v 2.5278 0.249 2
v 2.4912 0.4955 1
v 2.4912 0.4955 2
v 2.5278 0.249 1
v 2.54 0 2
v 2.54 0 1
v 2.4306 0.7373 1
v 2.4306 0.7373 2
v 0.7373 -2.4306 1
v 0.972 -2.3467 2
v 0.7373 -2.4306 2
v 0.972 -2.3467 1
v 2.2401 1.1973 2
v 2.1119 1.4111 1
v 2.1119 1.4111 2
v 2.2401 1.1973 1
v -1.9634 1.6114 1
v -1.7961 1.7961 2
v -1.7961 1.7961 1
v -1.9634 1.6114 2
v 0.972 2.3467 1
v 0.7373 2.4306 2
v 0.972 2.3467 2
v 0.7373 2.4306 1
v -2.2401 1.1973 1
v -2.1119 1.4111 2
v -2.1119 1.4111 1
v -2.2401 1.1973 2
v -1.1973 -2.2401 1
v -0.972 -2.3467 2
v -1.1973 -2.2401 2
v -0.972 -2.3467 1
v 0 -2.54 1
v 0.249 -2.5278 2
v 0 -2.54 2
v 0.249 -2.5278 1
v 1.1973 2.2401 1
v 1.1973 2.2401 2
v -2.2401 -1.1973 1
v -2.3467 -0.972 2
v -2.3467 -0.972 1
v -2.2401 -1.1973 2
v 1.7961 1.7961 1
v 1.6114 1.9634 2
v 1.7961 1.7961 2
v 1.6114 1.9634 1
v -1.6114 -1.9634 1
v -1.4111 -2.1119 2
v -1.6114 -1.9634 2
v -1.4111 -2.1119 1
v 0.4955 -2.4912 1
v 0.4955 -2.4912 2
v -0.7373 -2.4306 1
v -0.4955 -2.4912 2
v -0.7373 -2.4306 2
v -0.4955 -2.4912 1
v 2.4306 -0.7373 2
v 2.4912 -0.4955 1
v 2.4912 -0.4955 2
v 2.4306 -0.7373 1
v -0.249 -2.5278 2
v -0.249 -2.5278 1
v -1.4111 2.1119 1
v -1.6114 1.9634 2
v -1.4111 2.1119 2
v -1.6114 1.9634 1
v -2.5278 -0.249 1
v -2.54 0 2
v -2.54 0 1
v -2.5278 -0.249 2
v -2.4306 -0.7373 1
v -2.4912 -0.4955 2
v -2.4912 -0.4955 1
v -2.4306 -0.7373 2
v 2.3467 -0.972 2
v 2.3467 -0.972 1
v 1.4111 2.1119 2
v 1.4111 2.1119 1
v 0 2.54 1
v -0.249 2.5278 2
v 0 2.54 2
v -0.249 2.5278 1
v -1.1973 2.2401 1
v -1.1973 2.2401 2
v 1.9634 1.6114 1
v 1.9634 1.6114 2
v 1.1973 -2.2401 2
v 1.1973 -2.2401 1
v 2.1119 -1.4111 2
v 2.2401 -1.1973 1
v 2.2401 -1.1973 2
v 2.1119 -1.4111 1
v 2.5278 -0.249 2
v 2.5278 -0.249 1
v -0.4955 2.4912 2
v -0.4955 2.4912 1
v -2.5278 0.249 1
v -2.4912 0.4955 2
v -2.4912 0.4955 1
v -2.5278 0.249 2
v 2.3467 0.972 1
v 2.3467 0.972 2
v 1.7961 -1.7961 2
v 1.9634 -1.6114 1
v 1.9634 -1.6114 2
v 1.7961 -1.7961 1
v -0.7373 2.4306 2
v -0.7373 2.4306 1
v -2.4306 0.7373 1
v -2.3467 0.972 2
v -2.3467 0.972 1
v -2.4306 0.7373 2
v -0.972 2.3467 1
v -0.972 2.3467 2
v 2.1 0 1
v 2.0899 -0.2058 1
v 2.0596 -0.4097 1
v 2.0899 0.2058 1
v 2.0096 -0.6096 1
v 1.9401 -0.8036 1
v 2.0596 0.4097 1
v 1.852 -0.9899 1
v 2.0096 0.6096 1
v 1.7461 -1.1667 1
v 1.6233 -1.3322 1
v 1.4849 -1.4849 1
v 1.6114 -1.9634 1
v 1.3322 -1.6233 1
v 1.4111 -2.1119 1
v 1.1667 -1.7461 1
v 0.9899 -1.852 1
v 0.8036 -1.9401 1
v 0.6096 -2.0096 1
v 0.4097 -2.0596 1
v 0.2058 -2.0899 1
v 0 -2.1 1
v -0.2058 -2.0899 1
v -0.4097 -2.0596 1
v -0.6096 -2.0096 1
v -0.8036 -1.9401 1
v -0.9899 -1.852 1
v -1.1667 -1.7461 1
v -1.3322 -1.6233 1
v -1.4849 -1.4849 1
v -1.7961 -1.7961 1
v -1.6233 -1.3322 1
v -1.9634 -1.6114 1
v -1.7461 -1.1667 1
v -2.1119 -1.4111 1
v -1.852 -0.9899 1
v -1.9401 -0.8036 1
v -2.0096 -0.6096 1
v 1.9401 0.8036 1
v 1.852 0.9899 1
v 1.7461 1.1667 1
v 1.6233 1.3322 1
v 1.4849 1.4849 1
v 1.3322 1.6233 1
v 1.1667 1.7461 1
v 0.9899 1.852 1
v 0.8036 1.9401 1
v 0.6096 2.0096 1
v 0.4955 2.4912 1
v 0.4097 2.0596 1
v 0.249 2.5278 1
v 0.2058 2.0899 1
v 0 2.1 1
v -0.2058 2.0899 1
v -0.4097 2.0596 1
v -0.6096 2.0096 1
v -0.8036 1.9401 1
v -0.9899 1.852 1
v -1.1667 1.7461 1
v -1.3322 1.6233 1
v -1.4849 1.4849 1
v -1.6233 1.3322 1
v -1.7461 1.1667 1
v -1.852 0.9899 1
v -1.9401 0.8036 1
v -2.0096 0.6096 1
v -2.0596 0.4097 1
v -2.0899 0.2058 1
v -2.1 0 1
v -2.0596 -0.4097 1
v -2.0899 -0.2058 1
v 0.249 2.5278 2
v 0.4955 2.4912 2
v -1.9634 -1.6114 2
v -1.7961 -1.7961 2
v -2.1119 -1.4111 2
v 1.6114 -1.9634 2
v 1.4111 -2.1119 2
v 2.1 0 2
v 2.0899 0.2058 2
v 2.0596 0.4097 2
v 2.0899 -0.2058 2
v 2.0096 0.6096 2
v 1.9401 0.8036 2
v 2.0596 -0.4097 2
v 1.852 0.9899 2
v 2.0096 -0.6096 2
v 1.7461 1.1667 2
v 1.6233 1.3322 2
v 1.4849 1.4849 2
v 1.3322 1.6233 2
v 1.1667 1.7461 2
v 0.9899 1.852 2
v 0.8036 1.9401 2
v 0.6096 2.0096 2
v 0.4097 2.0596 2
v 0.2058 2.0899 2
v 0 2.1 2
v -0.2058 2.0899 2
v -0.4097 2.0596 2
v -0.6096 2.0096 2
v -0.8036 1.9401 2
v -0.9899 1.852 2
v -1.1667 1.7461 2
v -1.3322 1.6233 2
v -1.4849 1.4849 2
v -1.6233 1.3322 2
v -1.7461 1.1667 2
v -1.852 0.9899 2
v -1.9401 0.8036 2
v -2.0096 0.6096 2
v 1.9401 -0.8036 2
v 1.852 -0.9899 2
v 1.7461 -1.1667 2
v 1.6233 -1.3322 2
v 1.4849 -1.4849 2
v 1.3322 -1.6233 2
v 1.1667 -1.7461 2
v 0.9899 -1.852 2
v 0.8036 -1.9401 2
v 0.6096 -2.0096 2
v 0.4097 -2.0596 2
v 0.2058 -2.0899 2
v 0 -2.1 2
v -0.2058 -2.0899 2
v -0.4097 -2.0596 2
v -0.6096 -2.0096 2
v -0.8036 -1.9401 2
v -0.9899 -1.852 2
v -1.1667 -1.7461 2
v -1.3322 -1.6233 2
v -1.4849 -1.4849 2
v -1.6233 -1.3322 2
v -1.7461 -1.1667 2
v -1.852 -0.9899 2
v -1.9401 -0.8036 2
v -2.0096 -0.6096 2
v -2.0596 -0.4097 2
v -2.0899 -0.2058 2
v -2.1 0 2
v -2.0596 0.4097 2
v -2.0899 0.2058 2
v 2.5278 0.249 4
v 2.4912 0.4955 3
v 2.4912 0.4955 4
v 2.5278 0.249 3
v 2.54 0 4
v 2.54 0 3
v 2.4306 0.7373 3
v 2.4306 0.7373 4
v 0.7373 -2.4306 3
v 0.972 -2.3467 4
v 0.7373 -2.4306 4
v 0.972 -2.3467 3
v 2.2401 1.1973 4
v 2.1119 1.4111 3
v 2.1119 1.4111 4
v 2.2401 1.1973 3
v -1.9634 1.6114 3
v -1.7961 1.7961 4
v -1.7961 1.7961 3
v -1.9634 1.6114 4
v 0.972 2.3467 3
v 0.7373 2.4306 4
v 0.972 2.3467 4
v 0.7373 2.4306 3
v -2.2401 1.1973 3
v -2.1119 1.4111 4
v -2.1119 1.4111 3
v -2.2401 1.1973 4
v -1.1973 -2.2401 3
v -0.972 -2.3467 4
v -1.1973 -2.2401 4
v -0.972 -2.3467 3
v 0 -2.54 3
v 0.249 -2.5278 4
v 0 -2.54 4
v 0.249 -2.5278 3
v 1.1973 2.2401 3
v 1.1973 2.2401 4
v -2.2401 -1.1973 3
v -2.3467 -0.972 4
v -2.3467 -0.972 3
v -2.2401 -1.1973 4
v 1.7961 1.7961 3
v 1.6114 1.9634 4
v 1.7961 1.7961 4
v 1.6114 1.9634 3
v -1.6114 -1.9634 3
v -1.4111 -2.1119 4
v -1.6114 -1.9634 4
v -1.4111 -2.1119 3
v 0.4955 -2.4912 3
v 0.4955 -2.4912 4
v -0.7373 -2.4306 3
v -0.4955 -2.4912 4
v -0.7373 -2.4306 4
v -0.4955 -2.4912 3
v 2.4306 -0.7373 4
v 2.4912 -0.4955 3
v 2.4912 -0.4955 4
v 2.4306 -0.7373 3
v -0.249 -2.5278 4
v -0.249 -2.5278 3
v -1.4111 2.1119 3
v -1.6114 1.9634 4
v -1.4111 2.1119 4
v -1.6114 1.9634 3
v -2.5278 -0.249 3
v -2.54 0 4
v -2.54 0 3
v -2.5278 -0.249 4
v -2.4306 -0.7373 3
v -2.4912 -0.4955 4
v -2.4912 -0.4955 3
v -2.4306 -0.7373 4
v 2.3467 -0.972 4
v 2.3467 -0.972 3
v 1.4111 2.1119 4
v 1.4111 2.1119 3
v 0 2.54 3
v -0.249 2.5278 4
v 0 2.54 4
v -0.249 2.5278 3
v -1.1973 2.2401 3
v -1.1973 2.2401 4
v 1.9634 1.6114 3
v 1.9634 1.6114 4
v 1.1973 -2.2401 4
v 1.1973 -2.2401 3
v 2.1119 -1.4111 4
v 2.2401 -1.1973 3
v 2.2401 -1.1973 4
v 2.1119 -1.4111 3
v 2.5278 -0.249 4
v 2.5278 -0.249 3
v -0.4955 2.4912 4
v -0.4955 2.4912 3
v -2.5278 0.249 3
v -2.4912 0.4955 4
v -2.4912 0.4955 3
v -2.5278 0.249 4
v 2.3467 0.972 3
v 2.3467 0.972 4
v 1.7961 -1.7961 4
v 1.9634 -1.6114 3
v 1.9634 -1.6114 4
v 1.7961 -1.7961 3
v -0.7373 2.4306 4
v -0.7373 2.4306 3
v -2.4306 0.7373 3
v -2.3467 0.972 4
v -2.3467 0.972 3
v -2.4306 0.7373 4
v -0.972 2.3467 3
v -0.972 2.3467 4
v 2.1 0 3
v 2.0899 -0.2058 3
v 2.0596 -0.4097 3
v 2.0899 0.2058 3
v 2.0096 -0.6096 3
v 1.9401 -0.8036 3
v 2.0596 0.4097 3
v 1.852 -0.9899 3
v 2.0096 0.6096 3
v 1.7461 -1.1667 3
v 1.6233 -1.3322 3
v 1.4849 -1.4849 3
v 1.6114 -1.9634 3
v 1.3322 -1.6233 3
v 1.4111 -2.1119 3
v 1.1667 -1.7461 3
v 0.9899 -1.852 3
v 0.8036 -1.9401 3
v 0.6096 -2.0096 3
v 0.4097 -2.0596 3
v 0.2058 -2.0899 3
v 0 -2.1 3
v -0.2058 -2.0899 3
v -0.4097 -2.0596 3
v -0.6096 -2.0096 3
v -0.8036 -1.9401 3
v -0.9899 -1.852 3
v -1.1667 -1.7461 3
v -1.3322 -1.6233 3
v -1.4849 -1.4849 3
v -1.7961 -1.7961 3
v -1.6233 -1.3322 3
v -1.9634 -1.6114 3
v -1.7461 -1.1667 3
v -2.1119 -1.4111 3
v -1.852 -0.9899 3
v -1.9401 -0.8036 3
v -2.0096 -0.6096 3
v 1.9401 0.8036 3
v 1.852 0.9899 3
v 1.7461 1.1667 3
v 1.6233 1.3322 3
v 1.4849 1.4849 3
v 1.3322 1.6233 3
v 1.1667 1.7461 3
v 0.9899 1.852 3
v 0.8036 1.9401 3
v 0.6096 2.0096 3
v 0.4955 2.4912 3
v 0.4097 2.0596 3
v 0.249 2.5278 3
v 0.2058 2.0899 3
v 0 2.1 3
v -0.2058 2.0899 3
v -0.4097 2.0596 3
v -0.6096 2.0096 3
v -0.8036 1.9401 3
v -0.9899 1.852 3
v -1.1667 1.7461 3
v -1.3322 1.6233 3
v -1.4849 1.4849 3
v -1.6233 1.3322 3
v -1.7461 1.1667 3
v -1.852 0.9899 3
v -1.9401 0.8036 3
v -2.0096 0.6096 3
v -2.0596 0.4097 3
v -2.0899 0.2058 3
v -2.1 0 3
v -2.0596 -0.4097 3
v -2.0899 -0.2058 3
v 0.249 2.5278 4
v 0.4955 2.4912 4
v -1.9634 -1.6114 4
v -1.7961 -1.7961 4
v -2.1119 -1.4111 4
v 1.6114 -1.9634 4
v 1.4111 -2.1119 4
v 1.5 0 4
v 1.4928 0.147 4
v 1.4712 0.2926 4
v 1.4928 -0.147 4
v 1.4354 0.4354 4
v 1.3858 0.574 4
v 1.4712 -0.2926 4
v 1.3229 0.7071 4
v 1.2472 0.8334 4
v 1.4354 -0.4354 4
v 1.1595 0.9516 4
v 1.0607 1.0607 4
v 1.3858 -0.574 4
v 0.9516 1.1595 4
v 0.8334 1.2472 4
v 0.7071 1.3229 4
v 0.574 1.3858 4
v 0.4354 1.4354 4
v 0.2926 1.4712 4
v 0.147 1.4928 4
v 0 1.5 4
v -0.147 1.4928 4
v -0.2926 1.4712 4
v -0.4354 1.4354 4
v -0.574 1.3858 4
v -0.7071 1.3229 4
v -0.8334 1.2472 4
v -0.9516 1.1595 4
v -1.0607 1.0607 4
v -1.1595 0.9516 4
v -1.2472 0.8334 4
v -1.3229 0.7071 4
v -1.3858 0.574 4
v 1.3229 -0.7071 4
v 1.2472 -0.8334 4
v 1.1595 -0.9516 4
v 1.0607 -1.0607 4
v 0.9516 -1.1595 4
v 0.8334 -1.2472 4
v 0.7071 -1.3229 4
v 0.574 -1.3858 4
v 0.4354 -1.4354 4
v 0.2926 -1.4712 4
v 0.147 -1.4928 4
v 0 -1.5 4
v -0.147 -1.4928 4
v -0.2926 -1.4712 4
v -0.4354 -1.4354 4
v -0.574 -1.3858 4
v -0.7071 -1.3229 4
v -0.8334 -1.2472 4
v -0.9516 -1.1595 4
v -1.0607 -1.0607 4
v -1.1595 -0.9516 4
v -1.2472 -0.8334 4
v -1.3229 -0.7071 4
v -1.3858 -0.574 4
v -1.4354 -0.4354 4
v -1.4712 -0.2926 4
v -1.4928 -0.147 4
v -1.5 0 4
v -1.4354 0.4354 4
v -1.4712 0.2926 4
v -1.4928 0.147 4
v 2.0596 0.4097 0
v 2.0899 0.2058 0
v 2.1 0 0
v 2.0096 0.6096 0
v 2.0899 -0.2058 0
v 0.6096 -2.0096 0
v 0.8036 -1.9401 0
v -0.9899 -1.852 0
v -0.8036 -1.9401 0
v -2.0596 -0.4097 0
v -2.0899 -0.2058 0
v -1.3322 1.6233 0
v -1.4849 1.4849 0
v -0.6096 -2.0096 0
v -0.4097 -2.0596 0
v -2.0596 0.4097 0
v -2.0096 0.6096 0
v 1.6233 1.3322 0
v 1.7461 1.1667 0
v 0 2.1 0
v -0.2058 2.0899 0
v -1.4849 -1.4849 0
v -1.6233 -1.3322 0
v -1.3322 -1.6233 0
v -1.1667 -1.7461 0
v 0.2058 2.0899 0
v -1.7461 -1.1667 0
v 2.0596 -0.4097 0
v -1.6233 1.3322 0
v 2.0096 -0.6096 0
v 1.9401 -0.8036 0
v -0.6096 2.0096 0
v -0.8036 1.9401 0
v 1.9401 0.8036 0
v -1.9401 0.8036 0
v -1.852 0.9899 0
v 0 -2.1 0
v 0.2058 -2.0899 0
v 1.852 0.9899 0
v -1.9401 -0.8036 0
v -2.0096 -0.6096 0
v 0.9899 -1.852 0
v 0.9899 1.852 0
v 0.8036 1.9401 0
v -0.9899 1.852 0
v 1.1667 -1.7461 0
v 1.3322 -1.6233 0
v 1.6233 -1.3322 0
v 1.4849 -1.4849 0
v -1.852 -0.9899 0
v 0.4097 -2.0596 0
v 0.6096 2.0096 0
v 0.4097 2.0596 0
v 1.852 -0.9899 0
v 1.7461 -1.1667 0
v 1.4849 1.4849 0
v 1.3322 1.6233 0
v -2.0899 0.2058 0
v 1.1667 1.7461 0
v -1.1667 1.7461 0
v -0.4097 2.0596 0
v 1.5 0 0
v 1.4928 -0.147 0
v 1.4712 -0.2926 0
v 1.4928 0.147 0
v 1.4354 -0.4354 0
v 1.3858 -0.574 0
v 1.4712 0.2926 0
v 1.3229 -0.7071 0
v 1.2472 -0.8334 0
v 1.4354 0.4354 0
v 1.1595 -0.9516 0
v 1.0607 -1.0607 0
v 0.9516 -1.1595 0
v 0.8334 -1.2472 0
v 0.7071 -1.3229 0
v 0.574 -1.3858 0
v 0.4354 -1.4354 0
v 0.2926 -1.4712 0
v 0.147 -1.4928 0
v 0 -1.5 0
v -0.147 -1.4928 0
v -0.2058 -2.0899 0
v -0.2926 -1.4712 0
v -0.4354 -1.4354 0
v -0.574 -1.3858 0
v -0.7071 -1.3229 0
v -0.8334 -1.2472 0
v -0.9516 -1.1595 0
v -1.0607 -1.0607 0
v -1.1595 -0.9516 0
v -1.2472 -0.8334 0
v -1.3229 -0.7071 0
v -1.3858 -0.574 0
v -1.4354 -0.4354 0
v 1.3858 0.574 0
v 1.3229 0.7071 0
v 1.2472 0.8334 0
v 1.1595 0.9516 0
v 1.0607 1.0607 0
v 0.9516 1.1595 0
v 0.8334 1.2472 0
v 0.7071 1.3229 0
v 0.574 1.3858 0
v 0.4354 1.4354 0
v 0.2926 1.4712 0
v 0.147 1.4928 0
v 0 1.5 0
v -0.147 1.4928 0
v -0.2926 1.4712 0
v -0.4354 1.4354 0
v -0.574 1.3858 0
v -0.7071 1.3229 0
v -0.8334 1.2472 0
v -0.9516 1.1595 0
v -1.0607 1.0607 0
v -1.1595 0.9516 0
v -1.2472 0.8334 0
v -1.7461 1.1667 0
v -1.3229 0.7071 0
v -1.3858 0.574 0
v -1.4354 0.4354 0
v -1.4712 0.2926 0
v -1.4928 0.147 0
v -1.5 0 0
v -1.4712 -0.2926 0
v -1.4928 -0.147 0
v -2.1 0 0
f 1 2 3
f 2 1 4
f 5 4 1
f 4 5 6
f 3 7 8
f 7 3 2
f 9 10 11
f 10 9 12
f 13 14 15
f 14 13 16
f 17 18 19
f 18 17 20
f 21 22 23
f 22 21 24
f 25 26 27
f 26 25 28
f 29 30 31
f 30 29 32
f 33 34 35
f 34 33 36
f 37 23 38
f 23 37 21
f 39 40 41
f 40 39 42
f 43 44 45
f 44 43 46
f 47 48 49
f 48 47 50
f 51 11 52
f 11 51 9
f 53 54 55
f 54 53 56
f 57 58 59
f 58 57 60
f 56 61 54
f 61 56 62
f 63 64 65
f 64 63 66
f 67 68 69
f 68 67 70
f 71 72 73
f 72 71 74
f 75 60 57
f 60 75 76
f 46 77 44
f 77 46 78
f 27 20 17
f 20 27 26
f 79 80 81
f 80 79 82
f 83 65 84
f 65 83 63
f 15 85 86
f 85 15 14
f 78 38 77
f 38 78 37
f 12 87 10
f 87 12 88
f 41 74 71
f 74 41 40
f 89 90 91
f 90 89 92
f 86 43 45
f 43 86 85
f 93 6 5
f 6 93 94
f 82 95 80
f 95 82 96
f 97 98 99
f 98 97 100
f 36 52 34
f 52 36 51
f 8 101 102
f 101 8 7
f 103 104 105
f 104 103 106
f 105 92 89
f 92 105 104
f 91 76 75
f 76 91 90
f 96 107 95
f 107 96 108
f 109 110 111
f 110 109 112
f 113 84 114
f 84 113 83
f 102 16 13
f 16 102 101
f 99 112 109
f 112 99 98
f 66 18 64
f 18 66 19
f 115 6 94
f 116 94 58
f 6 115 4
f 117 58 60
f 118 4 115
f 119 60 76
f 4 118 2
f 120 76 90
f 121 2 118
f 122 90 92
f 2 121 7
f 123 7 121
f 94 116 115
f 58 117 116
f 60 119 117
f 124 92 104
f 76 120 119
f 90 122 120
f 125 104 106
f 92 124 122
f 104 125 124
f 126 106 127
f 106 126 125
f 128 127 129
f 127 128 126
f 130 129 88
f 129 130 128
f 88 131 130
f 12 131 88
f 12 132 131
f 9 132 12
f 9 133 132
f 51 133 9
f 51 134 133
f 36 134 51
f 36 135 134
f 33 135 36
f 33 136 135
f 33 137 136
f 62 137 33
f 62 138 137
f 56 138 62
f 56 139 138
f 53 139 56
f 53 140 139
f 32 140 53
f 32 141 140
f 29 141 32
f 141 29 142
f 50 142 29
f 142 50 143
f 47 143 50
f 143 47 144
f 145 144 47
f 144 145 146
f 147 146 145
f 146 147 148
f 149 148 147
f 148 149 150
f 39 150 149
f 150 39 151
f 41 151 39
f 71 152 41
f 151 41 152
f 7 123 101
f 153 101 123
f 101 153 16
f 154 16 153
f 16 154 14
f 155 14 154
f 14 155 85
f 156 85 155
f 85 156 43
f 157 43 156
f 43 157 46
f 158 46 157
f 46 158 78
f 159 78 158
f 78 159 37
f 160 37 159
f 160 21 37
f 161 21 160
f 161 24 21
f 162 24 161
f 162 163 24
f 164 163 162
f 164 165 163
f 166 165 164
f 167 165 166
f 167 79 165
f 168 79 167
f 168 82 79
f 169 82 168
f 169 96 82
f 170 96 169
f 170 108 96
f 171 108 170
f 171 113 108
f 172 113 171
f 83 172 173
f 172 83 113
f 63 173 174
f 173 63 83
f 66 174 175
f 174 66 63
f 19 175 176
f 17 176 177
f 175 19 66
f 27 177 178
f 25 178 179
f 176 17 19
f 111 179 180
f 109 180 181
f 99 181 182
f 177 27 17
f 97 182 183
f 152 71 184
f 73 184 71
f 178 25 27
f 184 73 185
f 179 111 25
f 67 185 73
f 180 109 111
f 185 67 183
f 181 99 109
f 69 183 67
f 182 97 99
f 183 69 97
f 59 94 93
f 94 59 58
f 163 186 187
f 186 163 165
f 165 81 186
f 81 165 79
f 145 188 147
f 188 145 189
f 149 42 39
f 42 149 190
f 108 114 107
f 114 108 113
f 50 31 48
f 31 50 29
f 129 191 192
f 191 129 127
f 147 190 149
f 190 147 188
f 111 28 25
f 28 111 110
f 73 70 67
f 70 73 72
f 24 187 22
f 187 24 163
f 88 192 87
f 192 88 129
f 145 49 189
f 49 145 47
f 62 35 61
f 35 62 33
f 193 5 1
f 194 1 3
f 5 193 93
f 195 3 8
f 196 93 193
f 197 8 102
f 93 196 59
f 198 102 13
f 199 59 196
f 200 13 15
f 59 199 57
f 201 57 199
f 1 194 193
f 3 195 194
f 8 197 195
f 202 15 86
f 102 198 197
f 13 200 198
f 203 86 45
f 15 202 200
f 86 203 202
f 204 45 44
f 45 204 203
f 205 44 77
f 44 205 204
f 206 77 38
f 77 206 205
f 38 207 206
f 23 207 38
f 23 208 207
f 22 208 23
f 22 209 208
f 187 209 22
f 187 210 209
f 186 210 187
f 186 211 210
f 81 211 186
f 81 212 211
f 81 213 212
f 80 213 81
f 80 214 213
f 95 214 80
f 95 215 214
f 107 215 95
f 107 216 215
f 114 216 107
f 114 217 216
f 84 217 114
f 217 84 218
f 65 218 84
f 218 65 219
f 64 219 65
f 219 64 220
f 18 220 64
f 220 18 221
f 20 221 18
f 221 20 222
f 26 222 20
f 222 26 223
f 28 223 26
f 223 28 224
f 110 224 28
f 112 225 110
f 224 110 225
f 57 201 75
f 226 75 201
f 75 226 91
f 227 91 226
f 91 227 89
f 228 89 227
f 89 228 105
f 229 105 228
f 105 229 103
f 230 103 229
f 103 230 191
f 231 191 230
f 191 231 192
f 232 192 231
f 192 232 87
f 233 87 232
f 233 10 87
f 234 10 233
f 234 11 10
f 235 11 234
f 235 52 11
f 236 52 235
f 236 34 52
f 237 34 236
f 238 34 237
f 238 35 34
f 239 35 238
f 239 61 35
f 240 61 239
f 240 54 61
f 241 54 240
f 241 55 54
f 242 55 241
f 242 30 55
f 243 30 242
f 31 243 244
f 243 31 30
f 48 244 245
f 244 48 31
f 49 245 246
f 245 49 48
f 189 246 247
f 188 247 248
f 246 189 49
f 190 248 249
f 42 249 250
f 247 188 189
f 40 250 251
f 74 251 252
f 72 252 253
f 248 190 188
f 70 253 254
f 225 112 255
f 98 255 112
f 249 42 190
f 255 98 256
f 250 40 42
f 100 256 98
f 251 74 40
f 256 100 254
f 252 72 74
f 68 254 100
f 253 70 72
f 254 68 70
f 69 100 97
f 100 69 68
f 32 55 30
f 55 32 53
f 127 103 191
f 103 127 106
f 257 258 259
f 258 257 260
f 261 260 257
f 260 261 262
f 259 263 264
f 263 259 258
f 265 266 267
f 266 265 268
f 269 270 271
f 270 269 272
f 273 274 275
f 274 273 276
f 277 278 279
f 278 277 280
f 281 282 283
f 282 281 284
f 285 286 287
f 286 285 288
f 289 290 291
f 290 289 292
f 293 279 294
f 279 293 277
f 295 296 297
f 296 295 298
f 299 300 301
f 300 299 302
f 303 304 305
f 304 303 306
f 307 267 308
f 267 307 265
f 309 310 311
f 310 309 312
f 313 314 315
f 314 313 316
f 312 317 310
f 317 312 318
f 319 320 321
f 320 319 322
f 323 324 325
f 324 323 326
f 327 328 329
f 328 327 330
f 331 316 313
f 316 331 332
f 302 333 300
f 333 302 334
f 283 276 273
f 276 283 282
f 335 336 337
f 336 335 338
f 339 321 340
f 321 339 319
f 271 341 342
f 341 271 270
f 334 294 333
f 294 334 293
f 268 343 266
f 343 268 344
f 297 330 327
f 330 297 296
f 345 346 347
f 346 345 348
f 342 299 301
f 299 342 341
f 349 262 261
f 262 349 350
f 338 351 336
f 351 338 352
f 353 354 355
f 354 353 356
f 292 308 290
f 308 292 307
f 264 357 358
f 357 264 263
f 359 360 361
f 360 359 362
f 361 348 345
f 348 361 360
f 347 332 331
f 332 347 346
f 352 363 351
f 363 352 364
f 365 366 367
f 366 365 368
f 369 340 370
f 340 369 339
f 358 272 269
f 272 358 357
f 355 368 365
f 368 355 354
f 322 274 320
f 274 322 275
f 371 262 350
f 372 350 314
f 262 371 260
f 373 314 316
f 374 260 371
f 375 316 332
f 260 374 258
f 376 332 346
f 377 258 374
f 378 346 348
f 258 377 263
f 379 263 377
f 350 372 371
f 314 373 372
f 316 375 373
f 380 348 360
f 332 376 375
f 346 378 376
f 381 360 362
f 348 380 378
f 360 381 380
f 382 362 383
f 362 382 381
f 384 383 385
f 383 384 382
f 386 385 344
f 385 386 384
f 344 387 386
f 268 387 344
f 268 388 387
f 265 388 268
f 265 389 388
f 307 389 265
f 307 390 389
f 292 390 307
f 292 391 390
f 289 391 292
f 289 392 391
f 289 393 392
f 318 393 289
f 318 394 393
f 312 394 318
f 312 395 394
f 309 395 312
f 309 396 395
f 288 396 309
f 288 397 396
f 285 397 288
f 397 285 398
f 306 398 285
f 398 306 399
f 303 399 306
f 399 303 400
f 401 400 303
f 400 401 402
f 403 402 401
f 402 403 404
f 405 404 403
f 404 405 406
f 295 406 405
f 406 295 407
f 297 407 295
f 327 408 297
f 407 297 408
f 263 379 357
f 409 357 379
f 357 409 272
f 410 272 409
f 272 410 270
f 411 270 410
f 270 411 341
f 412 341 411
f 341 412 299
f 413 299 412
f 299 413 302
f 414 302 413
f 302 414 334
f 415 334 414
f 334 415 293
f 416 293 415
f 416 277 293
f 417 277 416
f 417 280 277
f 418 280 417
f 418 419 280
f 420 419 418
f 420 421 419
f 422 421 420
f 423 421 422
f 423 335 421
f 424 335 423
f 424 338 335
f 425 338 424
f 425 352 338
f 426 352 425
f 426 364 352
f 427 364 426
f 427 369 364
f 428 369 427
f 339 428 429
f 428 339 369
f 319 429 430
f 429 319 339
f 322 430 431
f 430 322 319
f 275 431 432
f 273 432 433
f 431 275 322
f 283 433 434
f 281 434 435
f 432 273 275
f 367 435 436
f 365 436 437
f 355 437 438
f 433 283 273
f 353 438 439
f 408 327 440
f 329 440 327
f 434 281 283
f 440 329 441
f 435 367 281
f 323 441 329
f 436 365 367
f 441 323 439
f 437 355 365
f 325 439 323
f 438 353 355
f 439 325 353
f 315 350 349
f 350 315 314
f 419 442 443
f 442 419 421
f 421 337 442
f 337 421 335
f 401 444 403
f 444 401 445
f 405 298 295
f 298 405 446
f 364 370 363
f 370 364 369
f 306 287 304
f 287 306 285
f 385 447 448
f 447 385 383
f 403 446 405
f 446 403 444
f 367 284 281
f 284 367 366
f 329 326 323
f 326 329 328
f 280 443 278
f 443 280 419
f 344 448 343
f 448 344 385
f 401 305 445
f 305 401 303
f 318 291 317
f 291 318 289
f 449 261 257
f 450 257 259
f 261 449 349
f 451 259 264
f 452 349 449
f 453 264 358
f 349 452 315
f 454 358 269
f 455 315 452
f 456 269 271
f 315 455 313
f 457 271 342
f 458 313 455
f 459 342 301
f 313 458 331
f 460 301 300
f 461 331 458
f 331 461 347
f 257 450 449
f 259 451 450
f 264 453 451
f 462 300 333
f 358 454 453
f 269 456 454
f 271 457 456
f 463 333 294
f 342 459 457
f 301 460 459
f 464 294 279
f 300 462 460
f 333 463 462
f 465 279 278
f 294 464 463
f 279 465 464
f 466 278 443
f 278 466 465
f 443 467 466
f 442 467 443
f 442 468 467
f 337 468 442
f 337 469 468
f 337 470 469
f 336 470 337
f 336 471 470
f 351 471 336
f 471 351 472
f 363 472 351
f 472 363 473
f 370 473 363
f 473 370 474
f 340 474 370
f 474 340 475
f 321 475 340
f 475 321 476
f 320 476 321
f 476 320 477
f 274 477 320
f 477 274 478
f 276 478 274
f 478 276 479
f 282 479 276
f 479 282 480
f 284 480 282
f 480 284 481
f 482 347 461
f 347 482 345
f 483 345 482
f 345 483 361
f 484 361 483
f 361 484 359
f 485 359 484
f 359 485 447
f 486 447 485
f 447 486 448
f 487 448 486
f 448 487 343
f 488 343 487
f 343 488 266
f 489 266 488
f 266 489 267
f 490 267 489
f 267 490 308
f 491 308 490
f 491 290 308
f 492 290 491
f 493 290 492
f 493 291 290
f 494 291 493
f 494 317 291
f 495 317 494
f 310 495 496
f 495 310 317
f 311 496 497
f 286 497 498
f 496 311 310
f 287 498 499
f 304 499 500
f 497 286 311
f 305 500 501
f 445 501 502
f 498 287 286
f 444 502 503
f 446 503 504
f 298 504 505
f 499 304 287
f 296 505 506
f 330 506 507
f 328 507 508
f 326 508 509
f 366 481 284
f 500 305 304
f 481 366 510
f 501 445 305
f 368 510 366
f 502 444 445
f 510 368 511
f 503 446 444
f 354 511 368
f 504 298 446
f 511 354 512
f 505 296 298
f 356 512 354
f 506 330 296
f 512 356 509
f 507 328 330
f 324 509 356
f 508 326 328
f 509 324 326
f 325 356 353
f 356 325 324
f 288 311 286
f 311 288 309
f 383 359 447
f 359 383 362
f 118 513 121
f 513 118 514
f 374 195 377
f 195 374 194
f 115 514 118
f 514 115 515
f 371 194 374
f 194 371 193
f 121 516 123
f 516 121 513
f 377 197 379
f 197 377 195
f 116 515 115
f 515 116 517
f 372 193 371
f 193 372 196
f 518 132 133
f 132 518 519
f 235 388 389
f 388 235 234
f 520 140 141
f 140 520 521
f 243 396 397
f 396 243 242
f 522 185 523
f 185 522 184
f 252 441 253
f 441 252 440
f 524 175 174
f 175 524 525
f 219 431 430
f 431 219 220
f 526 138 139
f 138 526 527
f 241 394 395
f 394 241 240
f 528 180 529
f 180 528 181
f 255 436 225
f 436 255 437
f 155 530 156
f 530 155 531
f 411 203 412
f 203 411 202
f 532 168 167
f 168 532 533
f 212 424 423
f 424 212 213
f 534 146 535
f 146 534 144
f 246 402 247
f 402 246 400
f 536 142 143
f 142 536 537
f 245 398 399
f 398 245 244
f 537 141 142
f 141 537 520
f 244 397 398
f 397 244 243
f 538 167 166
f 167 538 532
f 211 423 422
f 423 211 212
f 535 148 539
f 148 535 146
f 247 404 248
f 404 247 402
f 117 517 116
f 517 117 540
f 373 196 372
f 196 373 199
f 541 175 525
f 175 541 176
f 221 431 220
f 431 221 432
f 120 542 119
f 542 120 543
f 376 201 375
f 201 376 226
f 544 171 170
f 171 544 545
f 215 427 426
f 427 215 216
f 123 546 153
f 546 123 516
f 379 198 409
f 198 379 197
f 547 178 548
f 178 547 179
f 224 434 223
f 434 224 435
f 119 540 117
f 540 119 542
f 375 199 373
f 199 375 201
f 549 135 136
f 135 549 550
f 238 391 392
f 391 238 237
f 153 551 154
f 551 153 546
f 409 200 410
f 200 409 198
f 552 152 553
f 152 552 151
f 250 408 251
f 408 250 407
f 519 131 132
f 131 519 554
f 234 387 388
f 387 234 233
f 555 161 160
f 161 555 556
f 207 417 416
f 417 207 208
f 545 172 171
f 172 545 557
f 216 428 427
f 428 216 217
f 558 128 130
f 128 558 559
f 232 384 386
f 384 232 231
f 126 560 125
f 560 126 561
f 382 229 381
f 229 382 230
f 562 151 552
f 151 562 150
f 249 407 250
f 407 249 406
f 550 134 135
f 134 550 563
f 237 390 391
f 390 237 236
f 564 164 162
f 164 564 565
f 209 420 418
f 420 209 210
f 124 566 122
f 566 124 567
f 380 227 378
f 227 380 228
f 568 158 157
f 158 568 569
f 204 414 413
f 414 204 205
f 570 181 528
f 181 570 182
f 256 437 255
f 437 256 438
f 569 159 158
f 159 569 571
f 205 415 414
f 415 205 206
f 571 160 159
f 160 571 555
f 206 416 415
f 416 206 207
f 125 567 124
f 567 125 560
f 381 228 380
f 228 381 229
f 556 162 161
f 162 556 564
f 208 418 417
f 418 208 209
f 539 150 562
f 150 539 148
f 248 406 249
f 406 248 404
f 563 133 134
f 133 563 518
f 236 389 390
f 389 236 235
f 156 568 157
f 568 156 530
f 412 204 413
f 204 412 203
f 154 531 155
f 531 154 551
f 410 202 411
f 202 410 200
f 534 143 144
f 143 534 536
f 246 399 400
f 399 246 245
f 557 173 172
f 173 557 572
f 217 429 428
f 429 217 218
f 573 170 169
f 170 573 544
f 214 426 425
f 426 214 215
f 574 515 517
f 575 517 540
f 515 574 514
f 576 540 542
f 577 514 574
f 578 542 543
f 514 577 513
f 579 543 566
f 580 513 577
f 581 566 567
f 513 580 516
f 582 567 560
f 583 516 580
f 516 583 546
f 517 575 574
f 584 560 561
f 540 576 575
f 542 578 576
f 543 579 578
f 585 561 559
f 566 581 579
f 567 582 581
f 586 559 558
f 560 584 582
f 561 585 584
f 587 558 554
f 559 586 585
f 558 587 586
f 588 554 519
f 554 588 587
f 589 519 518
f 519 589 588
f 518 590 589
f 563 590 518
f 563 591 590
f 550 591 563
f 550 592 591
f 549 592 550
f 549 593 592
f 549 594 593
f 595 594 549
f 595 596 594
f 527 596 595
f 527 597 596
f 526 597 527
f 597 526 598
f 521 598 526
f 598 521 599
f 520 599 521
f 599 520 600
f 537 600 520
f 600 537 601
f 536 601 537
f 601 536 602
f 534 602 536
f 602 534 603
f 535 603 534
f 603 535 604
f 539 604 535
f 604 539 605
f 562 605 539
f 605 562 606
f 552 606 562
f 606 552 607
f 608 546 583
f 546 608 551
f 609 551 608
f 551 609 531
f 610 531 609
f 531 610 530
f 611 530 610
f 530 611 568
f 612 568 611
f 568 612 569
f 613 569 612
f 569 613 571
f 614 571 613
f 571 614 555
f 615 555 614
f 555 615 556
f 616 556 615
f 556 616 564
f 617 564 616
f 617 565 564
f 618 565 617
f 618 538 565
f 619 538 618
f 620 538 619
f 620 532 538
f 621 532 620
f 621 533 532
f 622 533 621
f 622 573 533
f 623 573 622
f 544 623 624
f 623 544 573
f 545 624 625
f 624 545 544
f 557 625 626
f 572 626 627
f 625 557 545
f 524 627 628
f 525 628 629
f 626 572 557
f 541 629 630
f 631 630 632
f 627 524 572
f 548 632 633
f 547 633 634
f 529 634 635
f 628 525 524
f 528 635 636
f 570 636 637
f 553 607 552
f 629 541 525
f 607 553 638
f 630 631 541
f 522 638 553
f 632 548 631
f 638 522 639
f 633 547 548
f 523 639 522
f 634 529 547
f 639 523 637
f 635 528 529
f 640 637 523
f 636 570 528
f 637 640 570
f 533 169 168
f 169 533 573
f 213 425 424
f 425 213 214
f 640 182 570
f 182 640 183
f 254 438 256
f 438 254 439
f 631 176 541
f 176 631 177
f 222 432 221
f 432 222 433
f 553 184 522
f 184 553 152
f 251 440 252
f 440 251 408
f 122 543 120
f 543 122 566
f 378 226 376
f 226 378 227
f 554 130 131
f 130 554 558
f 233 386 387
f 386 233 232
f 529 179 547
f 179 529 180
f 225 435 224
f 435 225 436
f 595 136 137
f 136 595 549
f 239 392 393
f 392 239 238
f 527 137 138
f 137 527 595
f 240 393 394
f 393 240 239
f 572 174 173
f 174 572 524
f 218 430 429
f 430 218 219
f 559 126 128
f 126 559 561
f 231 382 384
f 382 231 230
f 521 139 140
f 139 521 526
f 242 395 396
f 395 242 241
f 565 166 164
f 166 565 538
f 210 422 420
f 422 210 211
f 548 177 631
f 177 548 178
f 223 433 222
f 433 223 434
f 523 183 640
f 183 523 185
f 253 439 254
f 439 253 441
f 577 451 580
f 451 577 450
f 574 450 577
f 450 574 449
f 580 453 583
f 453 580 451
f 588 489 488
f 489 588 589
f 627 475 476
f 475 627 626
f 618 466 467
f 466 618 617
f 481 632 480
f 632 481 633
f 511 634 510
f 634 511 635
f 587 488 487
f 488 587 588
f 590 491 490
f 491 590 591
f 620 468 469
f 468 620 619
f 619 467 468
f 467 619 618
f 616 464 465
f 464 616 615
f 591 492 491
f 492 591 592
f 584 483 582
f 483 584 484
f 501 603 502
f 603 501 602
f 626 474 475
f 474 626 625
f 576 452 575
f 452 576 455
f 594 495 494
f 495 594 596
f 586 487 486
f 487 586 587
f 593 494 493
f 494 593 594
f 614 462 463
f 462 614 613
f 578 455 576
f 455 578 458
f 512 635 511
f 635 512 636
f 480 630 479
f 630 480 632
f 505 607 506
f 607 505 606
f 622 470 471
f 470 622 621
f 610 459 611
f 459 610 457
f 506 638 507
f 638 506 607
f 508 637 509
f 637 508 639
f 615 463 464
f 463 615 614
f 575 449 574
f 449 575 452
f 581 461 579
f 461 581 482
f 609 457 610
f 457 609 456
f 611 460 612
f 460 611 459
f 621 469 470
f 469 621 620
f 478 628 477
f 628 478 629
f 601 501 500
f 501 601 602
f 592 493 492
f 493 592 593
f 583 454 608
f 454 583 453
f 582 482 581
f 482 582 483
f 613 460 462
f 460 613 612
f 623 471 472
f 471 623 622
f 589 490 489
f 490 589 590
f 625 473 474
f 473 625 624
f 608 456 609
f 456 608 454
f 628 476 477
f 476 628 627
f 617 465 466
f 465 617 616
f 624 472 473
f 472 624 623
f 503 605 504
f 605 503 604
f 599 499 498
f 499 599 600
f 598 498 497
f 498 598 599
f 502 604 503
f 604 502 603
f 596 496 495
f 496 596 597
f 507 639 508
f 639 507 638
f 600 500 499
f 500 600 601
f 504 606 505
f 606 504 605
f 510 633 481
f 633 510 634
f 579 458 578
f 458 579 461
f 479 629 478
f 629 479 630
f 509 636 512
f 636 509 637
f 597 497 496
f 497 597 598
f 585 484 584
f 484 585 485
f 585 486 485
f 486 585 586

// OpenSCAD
// file: colors.scad
module copper() {
  color("#b87333") children();
}

module nickel() {
  color("#9a9590") children();
}

module pcb() {
  color("#008c32") children();
}

module clear_acrylic() {
  color("#ffffff10") children();
}
// file: parameters.scad
$fn = 64;

shrink_factor = 0.994; // I forgot to calibrate my ASA printer, so I'm using this factor to shrink the model after the fact

h = 70.3; // cell max height
d = 21.5 * shrink_factor; // cell max diameter

available_y = 19.5 * 25.4;

aluminum_thickness = 0.04 * 25.4; // 5052 H32 Aluminum for the case
case_dim_x = 137; // external dimensions, must be 137 to match the EIG battery box
case_dim_y = 228; // 235 is the max, can be smaller
case_dim_z = 355; // 

external_walls = 3; // acrylic

base_plate_dim_x = case_dim_x - 2 * external_walls;
base_plate_dim_y = case_dim_y - 2 * external_walls;

cell_isolation = 1 * shrink_factor; // minimum separation between cells not in parallel

plate_disk_dia = 14;
copper_width = 10;
copper_length = 9.8 * d;

nickel_width = 8;
nickel_length = 5.8 * d; // length of the nickel strip to connect 6 cells

plate_slot_length = 8;
plate_slot_width = 0.7;
copper_plate_thickness = 0.15;
nickel_plate_thickness = 0.15;
strips_pocket_height = 1;

plates_thickness = copper_plate_thickness + nickel_plate_thickness;

bulkhead_thickness = 20;

strips_clearance = 0.5;
holder_pocket_height = 5;
holder_walls = 0.5;

exploded = $t * 50;

inlet_stack_height = 20;
outlet_walls = 3;

m3_insert_od = 4.6; // 5mm OD minus some plastic to melt
m3_insert_length = 4 + 4; // 4 mm more than the insert length

m4_insert_od = 5.25; // this is the diameter of the hole, it must be smaller than the insert’s maximum OD
m4_insert_length = 8; // 2 mm more than the insert length

cell_holder_stack_height = 0.3;

strips_insulator_stack_height = 1.2;

module_60_height = h + cell_holder_stack_height * 2 + strips_insulator_stack_height * 2 + 7 * exploded;

large_spacer_stack_height = 7;

module_120_height = module_60_height * 2 + large_spacer_stack_height + exploded;

module_240_height = module_120_height * 2 + large_spacer_stack_height * 3 + exploded;

inlet_walls = 3;

ring_terminal_cutout_depth = 3;
busbar_cutout_depth = 3;
busbar_thickness = 1;
// main file
include <parameters.scad>
use <colors.scad>

module insert_m3() {
  difference() {

    copper() union() {
        cylinder(h=4, d=4.2, center=false);
        for (z = [1, 3]) {
          translate([0, 0, z])
            cylinder(h=1, d=5.08, center=false);
        }
      }
    cylinder(h=100, d=3, center=true);
  }
}

module insert_m4() {
  difference() {

    copper() union() {
        cylinder(h=6, d=5.25, center=false);
        for (z = [1, 4]) {
          translate([0, 0, z])
            cylinder(h=2, d=6, center=false);
        }
      }
    cylinder(h=100, d=4, center=true);
  }
}

insert_m3();
